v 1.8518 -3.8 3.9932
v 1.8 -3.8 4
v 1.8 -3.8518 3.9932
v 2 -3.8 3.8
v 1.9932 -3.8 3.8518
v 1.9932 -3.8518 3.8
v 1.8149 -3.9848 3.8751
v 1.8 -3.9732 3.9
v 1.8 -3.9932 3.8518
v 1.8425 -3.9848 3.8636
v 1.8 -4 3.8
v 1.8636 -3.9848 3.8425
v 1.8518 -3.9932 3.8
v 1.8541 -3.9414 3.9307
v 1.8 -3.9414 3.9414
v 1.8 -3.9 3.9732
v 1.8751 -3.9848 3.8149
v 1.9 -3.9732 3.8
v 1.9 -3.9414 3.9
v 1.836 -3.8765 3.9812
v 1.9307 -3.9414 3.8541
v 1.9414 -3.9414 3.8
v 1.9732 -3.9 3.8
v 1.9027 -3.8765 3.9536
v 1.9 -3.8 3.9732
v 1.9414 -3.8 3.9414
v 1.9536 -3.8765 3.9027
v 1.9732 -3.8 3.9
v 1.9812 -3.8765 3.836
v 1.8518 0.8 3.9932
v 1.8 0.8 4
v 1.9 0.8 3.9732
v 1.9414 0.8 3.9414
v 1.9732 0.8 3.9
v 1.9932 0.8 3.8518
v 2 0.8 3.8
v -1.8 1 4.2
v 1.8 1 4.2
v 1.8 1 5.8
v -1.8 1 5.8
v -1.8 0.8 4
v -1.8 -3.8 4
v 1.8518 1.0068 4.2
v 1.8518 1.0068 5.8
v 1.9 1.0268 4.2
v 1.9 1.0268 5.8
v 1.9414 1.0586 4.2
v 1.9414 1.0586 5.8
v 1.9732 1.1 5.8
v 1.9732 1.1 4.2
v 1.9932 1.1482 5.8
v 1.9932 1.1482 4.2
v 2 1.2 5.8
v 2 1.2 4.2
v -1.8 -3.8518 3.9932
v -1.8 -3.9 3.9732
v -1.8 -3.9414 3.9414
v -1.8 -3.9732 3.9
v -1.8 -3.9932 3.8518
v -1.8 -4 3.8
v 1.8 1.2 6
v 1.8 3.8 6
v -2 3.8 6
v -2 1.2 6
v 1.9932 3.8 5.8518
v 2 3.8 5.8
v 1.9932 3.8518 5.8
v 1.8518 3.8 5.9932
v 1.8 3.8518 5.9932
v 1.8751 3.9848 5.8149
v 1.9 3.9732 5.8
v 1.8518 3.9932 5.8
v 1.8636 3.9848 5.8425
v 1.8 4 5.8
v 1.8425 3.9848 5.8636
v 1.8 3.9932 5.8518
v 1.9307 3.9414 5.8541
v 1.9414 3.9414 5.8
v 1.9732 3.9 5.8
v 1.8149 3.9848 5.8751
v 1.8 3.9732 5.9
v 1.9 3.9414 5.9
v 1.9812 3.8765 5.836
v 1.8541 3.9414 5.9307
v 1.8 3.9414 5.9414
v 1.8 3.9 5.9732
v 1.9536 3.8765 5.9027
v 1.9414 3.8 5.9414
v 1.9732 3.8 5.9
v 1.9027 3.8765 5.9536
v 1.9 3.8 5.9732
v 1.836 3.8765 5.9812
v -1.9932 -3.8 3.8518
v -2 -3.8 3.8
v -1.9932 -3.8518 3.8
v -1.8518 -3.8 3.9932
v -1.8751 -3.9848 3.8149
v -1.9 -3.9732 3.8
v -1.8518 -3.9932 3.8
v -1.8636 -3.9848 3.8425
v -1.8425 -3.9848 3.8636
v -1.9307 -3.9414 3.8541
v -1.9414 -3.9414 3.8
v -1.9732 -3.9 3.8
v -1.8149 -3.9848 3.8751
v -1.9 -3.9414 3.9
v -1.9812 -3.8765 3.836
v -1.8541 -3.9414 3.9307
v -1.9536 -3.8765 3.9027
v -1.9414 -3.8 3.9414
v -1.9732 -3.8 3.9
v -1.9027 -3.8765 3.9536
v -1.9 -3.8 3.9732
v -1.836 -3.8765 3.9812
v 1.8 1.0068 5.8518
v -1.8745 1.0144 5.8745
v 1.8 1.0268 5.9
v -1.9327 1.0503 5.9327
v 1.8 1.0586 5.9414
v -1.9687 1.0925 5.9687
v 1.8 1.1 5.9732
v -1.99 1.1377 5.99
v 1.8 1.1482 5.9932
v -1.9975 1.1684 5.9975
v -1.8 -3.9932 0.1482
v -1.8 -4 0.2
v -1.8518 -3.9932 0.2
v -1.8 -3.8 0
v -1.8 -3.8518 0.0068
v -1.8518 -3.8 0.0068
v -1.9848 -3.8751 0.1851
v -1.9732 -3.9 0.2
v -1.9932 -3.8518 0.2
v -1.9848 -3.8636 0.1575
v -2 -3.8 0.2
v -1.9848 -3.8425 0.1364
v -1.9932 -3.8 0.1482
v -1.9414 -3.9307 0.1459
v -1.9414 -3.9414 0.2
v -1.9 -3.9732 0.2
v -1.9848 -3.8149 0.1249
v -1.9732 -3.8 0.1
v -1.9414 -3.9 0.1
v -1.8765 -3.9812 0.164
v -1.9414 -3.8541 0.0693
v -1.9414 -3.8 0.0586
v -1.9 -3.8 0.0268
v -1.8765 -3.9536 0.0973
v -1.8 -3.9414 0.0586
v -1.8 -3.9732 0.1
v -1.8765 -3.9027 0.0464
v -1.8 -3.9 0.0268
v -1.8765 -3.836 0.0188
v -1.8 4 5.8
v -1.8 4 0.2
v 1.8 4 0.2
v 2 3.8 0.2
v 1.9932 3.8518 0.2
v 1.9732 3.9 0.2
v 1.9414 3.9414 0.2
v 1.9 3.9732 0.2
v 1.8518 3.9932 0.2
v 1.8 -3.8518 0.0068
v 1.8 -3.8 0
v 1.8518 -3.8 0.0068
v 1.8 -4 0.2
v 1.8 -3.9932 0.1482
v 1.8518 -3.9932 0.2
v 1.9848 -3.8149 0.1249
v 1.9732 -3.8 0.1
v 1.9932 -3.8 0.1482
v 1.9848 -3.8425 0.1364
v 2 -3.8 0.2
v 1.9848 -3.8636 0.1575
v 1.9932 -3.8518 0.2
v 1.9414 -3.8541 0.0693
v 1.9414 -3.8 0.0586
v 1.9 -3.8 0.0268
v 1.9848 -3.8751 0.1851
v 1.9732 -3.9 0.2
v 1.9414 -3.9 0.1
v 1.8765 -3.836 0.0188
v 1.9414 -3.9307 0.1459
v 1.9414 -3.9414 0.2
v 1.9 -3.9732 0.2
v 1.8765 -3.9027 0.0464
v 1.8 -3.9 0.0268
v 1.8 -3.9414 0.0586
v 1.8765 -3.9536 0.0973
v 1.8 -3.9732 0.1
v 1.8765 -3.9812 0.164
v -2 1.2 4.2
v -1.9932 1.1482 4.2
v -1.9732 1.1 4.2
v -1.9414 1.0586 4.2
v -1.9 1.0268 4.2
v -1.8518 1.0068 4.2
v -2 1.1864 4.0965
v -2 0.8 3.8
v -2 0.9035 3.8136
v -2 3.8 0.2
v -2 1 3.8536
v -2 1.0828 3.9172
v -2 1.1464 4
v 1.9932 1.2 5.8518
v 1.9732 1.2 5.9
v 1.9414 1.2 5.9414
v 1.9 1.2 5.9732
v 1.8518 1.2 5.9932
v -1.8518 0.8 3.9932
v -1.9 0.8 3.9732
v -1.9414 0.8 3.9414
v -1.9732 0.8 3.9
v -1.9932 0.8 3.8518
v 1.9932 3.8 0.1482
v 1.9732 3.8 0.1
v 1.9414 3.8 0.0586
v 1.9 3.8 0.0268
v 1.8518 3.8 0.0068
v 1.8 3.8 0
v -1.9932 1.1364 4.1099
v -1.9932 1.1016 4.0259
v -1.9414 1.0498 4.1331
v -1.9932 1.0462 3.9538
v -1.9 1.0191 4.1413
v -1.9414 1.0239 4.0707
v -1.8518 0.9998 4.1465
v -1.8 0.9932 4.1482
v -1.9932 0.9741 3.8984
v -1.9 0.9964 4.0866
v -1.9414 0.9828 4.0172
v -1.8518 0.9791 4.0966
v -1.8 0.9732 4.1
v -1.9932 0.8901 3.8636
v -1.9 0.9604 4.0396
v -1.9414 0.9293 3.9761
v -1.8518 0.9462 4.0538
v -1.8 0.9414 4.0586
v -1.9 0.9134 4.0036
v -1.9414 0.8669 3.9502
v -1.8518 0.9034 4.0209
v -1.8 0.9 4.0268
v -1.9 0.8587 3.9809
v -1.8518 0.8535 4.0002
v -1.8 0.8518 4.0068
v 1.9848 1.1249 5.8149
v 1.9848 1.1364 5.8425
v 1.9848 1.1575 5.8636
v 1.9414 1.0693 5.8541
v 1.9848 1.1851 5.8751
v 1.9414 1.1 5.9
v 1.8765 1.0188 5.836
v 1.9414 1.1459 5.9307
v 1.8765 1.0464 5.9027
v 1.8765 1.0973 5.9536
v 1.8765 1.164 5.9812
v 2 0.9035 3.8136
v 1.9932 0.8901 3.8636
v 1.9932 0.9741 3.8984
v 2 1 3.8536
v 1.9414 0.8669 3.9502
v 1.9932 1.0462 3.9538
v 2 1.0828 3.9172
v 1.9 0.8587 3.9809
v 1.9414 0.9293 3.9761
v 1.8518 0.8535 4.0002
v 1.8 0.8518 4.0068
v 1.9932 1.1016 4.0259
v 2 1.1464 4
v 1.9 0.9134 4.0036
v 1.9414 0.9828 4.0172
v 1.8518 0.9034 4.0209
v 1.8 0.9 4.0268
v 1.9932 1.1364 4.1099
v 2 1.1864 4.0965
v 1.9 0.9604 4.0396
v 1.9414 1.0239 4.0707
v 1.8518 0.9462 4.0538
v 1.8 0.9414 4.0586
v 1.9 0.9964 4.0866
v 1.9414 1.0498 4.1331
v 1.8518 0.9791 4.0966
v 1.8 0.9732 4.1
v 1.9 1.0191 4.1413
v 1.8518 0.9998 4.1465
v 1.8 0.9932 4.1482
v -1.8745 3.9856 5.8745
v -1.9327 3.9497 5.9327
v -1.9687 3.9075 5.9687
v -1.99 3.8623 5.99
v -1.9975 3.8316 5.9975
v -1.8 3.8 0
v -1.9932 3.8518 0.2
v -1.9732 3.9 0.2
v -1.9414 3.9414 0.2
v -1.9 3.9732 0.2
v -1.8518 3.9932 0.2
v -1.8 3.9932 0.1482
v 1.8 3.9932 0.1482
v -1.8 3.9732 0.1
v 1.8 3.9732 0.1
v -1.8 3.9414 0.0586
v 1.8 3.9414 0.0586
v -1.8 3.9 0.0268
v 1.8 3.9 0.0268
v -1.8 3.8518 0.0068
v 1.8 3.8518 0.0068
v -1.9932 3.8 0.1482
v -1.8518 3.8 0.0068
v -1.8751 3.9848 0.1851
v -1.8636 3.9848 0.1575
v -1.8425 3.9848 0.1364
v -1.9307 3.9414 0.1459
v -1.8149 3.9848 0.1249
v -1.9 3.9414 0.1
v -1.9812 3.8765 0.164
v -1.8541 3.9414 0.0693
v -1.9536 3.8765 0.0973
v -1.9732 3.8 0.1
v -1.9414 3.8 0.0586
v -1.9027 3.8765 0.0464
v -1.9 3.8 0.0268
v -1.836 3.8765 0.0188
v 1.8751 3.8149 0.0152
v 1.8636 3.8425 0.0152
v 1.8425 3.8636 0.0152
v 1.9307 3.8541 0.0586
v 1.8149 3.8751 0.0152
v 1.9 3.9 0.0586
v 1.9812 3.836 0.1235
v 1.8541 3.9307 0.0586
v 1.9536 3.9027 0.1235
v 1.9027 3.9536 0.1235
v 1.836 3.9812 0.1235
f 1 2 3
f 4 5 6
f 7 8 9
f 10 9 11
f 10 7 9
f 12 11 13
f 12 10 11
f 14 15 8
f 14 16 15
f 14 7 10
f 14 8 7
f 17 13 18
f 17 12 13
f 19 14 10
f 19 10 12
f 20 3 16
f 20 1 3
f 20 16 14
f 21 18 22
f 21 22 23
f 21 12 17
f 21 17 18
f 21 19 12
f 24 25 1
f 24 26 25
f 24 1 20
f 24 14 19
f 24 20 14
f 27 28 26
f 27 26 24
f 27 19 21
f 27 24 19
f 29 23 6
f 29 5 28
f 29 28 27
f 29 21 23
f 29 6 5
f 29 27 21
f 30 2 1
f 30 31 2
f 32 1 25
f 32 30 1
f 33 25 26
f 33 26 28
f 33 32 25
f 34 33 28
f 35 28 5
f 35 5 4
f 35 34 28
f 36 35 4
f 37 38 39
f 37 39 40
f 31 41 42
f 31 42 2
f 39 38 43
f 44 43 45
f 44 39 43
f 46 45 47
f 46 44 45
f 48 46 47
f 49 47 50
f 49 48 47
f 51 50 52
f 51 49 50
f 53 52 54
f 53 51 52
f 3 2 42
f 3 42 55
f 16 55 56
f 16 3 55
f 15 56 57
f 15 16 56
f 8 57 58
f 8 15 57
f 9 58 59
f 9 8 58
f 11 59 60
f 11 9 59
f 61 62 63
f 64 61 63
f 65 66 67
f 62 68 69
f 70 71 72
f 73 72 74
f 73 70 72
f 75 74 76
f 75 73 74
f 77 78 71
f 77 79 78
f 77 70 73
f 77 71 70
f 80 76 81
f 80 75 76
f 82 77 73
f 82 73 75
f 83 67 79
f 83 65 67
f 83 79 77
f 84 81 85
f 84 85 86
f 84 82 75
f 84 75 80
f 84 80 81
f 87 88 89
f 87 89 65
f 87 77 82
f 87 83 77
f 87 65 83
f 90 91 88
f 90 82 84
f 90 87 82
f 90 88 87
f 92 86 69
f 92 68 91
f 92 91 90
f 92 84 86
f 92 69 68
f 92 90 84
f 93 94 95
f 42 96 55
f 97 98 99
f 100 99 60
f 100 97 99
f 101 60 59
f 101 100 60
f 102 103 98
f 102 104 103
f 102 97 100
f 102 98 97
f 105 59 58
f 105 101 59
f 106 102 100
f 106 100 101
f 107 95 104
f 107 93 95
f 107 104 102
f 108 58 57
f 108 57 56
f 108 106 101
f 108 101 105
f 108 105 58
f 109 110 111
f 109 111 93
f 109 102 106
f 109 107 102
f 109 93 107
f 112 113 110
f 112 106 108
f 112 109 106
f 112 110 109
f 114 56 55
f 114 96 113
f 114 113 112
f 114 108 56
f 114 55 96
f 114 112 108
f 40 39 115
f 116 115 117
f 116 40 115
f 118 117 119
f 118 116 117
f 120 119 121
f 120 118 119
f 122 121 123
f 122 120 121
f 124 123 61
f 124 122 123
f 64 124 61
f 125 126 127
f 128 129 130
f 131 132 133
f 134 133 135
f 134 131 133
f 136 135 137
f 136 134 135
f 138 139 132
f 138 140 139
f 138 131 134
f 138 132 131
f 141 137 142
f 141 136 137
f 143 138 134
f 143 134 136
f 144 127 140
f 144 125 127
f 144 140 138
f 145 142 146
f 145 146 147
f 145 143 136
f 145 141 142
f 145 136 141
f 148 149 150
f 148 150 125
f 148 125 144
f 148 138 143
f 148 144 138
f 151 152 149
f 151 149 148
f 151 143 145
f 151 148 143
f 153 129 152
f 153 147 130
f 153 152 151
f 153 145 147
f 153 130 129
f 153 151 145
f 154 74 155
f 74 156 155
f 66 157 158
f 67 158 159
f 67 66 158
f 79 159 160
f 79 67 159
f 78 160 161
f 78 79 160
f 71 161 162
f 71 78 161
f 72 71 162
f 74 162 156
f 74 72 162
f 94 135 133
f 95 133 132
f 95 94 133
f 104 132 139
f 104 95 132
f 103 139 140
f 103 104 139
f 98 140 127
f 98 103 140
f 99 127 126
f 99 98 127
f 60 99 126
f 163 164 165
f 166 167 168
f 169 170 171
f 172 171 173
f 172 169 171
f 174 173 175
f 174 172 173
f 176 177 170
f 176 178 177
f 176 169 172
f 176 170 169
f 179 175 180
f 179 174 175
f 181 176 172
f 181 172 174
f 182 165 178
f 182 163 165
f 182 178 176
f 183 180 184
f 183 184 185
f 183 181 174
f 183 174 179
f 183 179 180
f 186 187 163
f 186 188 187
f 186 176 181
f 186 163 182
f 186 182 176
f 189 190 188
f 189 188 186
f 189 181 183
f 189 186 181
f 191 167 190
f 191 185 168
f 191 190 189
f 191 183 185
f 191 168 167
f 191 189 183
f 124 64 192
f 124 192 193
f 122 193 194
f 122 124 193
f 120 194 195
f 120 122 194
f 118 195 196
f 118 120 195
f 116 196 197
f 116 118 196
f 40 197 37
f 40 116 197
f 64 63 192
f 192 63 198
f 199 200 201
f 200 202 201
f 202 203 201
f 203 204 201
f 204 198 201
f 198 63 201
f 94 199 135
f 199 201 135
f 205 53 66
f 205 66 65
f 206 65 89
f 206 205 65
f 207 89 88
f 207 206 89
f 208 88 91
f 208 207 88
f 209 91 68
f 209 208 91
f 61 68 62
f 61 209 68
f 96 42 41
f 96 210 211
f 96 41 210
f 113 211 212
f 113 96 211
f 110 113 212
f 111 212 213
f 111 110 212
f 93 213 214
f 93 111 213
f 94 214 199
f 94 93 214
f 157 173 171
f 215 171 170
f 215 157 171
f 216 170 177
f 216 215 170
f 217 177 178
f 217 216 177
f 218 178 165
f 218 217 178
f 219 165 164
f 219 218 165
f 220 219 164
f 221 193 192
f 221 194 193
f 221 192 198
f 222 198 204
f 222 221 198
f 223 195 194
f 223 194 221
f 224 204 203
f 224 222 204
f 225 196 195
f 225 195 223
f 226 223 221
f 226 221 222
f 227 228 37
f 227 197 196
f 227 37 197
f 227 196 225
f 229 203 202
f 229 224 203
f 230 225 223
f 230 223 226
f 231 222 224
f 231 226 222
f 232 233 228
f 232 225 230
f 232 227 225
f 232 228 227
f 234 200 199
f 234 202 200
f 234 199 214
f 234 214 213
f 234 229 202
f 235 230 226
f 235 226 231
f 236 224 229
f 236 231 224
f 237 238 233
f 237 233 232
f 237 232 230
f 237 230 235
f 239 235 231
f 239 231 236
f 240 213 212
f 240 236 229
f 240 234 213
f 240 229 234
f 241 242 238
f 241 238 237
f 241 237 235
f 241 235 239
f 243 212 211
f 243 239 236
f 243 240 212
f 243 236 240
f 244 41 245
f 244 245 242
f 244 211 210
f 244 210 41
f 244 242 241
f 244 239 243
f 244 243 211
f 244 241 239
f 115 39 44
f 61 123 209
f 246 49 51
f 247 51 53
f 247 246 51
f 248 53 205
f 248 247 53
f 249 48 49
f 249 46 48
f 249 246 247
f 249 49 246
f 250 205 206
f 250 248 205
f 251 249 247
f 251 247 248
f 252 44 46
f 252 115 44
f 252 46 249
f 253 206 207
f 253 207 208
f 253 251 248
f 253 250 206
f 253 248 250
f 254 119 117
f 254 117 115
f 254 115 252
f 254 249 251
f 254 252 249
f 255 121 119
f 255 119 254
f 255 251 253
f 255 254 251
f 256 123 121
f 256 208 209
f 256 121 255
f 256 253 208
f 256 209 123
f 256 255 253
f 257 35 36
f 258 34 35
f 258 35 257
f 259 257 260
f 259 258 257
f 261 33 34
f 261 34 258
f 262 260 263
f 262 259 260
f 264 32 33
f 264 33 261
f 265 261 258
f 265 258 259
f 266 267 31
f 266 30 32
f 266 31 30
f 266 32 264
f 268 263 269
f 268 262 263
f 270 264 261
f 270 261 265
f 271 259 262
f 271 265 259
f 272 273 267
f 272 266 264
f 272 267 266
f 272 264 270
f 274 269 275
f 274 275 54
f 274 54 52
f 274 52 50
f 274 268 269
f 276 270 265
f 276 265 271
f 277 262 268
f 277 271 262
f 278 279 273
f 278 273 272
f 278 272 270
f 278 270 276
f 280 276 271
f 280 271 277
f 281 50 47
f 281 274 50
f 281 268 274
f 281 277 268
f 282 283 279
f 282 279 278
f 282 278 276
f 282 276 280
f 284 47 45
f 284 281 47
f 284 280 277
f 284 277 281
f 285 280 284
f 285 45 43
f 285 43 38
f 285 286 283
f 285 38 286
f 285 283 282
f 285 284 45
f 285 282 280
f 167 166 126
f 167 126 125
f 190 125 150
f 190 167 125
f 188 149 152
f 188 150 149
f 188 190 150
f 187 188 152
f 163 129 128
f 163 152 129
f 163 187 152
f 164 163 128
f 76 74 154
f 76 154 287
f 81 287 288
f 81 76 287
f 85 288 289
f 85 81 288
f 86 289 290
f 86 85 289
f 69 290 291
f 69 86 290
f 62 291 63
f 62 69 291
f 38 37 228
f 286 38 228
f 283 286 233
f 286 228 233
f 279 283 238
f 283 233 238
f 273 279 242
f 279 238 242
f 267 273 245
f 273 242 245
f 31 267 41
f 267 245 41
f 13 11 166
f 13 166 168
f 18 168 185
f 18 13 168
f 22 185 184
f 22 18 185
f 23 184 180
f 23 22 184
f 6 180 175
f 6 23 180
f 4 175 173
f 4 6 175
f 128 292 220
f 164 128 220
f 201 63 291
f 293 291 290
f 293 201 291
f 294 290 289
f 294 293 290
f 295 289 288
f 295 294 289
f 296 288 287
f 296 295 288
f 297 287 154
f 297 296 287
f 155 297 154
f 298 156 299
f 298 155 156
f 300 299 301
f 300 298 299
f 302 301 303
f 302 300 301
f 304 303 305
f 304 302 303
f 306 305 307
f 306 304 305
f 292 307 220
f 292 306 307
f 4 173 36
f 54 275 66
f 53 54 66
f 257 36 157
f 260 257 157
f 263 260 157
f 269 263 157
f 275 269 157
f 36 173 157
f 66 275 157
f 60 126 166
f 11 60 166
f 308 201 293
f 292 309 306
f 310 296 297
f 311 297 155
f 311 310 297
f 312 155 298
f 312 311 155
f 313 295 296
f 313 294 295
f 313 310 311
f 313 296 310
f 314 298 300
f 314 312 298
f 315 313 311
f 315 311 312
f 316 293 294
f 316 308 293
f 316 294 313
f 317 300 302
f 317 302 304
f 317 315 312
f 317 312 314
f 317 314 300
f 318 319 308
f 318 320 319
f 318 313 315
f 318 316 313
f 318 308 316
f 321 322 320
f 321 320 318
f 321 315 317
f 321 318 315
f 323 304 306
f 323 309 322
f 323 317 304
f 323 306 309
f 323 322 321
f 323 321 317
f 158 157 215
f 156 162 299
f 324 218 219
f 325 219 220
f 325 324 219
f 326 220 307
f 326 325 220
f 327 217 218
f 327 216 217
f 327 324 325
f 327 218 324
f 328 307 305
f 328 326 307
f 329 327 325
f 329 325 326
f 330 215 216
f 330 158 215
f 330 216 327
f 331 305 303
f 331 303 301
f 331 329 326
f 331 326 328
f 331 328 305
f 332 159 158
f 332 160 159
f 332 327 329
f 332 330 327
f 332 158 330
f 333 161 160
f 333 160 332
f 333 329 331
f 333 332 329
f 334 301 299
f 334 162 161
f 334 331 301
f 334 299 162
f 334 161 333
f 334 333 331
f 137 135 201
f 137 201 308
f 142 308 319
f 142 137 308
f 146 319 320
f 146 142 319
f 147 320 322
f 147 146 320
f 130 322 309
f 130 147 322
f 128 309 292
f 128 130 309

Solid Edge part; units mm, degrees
sketch "Sketch1" plane through (0, 0, 0) normal (0, 0, 1) x (1, 0, 0)
  line L0 (-2, -4) -> (2, -4)
  line L1 (2, -4) -> (2, 4)
  line L2 (2, 4) -> (-2, 4)
  line L3 (-2, 4) -> (-2, -4)
  dimension "D1" = 4
  dimension "D2" = 8
extrude "Protrusion1" add sketch "Sketch1" along normal blind 4
sketch "Sketch2" plane through (0, 0, 4) normal (0, 0, 1) x (1, 0, 0)
  line L0 (-2, 4) -> (2, 4)
  line L1 (2, 4) -> (2, 1)
  line L2 (2, 1) -> (-2, 1)
  line L3 (-2, 1) -> (-2, 4)
  dimension "D1" = 5
extrude "ExtrudedProtrusion_2" add sketch "Sketch2" along normal blind 2
fillet "Round_1" radius 0.2 17 edges at (0, 1, 6) (0, 1, 4) (2, 2.5, 6) (0, 4, 6) (2, 4, 3) (2, -1.5, 4) (-2, -1.5, 4) (0, -4, 4) (0, -4, 0) (2, 0, 0) (-2, 0, 0) (-2, 4, 3) (0, 4, 0) (-2, -4, 2) (2, -4, 2) (2, 1, 5) (-2, 1, 5)
properties material "Steel"
